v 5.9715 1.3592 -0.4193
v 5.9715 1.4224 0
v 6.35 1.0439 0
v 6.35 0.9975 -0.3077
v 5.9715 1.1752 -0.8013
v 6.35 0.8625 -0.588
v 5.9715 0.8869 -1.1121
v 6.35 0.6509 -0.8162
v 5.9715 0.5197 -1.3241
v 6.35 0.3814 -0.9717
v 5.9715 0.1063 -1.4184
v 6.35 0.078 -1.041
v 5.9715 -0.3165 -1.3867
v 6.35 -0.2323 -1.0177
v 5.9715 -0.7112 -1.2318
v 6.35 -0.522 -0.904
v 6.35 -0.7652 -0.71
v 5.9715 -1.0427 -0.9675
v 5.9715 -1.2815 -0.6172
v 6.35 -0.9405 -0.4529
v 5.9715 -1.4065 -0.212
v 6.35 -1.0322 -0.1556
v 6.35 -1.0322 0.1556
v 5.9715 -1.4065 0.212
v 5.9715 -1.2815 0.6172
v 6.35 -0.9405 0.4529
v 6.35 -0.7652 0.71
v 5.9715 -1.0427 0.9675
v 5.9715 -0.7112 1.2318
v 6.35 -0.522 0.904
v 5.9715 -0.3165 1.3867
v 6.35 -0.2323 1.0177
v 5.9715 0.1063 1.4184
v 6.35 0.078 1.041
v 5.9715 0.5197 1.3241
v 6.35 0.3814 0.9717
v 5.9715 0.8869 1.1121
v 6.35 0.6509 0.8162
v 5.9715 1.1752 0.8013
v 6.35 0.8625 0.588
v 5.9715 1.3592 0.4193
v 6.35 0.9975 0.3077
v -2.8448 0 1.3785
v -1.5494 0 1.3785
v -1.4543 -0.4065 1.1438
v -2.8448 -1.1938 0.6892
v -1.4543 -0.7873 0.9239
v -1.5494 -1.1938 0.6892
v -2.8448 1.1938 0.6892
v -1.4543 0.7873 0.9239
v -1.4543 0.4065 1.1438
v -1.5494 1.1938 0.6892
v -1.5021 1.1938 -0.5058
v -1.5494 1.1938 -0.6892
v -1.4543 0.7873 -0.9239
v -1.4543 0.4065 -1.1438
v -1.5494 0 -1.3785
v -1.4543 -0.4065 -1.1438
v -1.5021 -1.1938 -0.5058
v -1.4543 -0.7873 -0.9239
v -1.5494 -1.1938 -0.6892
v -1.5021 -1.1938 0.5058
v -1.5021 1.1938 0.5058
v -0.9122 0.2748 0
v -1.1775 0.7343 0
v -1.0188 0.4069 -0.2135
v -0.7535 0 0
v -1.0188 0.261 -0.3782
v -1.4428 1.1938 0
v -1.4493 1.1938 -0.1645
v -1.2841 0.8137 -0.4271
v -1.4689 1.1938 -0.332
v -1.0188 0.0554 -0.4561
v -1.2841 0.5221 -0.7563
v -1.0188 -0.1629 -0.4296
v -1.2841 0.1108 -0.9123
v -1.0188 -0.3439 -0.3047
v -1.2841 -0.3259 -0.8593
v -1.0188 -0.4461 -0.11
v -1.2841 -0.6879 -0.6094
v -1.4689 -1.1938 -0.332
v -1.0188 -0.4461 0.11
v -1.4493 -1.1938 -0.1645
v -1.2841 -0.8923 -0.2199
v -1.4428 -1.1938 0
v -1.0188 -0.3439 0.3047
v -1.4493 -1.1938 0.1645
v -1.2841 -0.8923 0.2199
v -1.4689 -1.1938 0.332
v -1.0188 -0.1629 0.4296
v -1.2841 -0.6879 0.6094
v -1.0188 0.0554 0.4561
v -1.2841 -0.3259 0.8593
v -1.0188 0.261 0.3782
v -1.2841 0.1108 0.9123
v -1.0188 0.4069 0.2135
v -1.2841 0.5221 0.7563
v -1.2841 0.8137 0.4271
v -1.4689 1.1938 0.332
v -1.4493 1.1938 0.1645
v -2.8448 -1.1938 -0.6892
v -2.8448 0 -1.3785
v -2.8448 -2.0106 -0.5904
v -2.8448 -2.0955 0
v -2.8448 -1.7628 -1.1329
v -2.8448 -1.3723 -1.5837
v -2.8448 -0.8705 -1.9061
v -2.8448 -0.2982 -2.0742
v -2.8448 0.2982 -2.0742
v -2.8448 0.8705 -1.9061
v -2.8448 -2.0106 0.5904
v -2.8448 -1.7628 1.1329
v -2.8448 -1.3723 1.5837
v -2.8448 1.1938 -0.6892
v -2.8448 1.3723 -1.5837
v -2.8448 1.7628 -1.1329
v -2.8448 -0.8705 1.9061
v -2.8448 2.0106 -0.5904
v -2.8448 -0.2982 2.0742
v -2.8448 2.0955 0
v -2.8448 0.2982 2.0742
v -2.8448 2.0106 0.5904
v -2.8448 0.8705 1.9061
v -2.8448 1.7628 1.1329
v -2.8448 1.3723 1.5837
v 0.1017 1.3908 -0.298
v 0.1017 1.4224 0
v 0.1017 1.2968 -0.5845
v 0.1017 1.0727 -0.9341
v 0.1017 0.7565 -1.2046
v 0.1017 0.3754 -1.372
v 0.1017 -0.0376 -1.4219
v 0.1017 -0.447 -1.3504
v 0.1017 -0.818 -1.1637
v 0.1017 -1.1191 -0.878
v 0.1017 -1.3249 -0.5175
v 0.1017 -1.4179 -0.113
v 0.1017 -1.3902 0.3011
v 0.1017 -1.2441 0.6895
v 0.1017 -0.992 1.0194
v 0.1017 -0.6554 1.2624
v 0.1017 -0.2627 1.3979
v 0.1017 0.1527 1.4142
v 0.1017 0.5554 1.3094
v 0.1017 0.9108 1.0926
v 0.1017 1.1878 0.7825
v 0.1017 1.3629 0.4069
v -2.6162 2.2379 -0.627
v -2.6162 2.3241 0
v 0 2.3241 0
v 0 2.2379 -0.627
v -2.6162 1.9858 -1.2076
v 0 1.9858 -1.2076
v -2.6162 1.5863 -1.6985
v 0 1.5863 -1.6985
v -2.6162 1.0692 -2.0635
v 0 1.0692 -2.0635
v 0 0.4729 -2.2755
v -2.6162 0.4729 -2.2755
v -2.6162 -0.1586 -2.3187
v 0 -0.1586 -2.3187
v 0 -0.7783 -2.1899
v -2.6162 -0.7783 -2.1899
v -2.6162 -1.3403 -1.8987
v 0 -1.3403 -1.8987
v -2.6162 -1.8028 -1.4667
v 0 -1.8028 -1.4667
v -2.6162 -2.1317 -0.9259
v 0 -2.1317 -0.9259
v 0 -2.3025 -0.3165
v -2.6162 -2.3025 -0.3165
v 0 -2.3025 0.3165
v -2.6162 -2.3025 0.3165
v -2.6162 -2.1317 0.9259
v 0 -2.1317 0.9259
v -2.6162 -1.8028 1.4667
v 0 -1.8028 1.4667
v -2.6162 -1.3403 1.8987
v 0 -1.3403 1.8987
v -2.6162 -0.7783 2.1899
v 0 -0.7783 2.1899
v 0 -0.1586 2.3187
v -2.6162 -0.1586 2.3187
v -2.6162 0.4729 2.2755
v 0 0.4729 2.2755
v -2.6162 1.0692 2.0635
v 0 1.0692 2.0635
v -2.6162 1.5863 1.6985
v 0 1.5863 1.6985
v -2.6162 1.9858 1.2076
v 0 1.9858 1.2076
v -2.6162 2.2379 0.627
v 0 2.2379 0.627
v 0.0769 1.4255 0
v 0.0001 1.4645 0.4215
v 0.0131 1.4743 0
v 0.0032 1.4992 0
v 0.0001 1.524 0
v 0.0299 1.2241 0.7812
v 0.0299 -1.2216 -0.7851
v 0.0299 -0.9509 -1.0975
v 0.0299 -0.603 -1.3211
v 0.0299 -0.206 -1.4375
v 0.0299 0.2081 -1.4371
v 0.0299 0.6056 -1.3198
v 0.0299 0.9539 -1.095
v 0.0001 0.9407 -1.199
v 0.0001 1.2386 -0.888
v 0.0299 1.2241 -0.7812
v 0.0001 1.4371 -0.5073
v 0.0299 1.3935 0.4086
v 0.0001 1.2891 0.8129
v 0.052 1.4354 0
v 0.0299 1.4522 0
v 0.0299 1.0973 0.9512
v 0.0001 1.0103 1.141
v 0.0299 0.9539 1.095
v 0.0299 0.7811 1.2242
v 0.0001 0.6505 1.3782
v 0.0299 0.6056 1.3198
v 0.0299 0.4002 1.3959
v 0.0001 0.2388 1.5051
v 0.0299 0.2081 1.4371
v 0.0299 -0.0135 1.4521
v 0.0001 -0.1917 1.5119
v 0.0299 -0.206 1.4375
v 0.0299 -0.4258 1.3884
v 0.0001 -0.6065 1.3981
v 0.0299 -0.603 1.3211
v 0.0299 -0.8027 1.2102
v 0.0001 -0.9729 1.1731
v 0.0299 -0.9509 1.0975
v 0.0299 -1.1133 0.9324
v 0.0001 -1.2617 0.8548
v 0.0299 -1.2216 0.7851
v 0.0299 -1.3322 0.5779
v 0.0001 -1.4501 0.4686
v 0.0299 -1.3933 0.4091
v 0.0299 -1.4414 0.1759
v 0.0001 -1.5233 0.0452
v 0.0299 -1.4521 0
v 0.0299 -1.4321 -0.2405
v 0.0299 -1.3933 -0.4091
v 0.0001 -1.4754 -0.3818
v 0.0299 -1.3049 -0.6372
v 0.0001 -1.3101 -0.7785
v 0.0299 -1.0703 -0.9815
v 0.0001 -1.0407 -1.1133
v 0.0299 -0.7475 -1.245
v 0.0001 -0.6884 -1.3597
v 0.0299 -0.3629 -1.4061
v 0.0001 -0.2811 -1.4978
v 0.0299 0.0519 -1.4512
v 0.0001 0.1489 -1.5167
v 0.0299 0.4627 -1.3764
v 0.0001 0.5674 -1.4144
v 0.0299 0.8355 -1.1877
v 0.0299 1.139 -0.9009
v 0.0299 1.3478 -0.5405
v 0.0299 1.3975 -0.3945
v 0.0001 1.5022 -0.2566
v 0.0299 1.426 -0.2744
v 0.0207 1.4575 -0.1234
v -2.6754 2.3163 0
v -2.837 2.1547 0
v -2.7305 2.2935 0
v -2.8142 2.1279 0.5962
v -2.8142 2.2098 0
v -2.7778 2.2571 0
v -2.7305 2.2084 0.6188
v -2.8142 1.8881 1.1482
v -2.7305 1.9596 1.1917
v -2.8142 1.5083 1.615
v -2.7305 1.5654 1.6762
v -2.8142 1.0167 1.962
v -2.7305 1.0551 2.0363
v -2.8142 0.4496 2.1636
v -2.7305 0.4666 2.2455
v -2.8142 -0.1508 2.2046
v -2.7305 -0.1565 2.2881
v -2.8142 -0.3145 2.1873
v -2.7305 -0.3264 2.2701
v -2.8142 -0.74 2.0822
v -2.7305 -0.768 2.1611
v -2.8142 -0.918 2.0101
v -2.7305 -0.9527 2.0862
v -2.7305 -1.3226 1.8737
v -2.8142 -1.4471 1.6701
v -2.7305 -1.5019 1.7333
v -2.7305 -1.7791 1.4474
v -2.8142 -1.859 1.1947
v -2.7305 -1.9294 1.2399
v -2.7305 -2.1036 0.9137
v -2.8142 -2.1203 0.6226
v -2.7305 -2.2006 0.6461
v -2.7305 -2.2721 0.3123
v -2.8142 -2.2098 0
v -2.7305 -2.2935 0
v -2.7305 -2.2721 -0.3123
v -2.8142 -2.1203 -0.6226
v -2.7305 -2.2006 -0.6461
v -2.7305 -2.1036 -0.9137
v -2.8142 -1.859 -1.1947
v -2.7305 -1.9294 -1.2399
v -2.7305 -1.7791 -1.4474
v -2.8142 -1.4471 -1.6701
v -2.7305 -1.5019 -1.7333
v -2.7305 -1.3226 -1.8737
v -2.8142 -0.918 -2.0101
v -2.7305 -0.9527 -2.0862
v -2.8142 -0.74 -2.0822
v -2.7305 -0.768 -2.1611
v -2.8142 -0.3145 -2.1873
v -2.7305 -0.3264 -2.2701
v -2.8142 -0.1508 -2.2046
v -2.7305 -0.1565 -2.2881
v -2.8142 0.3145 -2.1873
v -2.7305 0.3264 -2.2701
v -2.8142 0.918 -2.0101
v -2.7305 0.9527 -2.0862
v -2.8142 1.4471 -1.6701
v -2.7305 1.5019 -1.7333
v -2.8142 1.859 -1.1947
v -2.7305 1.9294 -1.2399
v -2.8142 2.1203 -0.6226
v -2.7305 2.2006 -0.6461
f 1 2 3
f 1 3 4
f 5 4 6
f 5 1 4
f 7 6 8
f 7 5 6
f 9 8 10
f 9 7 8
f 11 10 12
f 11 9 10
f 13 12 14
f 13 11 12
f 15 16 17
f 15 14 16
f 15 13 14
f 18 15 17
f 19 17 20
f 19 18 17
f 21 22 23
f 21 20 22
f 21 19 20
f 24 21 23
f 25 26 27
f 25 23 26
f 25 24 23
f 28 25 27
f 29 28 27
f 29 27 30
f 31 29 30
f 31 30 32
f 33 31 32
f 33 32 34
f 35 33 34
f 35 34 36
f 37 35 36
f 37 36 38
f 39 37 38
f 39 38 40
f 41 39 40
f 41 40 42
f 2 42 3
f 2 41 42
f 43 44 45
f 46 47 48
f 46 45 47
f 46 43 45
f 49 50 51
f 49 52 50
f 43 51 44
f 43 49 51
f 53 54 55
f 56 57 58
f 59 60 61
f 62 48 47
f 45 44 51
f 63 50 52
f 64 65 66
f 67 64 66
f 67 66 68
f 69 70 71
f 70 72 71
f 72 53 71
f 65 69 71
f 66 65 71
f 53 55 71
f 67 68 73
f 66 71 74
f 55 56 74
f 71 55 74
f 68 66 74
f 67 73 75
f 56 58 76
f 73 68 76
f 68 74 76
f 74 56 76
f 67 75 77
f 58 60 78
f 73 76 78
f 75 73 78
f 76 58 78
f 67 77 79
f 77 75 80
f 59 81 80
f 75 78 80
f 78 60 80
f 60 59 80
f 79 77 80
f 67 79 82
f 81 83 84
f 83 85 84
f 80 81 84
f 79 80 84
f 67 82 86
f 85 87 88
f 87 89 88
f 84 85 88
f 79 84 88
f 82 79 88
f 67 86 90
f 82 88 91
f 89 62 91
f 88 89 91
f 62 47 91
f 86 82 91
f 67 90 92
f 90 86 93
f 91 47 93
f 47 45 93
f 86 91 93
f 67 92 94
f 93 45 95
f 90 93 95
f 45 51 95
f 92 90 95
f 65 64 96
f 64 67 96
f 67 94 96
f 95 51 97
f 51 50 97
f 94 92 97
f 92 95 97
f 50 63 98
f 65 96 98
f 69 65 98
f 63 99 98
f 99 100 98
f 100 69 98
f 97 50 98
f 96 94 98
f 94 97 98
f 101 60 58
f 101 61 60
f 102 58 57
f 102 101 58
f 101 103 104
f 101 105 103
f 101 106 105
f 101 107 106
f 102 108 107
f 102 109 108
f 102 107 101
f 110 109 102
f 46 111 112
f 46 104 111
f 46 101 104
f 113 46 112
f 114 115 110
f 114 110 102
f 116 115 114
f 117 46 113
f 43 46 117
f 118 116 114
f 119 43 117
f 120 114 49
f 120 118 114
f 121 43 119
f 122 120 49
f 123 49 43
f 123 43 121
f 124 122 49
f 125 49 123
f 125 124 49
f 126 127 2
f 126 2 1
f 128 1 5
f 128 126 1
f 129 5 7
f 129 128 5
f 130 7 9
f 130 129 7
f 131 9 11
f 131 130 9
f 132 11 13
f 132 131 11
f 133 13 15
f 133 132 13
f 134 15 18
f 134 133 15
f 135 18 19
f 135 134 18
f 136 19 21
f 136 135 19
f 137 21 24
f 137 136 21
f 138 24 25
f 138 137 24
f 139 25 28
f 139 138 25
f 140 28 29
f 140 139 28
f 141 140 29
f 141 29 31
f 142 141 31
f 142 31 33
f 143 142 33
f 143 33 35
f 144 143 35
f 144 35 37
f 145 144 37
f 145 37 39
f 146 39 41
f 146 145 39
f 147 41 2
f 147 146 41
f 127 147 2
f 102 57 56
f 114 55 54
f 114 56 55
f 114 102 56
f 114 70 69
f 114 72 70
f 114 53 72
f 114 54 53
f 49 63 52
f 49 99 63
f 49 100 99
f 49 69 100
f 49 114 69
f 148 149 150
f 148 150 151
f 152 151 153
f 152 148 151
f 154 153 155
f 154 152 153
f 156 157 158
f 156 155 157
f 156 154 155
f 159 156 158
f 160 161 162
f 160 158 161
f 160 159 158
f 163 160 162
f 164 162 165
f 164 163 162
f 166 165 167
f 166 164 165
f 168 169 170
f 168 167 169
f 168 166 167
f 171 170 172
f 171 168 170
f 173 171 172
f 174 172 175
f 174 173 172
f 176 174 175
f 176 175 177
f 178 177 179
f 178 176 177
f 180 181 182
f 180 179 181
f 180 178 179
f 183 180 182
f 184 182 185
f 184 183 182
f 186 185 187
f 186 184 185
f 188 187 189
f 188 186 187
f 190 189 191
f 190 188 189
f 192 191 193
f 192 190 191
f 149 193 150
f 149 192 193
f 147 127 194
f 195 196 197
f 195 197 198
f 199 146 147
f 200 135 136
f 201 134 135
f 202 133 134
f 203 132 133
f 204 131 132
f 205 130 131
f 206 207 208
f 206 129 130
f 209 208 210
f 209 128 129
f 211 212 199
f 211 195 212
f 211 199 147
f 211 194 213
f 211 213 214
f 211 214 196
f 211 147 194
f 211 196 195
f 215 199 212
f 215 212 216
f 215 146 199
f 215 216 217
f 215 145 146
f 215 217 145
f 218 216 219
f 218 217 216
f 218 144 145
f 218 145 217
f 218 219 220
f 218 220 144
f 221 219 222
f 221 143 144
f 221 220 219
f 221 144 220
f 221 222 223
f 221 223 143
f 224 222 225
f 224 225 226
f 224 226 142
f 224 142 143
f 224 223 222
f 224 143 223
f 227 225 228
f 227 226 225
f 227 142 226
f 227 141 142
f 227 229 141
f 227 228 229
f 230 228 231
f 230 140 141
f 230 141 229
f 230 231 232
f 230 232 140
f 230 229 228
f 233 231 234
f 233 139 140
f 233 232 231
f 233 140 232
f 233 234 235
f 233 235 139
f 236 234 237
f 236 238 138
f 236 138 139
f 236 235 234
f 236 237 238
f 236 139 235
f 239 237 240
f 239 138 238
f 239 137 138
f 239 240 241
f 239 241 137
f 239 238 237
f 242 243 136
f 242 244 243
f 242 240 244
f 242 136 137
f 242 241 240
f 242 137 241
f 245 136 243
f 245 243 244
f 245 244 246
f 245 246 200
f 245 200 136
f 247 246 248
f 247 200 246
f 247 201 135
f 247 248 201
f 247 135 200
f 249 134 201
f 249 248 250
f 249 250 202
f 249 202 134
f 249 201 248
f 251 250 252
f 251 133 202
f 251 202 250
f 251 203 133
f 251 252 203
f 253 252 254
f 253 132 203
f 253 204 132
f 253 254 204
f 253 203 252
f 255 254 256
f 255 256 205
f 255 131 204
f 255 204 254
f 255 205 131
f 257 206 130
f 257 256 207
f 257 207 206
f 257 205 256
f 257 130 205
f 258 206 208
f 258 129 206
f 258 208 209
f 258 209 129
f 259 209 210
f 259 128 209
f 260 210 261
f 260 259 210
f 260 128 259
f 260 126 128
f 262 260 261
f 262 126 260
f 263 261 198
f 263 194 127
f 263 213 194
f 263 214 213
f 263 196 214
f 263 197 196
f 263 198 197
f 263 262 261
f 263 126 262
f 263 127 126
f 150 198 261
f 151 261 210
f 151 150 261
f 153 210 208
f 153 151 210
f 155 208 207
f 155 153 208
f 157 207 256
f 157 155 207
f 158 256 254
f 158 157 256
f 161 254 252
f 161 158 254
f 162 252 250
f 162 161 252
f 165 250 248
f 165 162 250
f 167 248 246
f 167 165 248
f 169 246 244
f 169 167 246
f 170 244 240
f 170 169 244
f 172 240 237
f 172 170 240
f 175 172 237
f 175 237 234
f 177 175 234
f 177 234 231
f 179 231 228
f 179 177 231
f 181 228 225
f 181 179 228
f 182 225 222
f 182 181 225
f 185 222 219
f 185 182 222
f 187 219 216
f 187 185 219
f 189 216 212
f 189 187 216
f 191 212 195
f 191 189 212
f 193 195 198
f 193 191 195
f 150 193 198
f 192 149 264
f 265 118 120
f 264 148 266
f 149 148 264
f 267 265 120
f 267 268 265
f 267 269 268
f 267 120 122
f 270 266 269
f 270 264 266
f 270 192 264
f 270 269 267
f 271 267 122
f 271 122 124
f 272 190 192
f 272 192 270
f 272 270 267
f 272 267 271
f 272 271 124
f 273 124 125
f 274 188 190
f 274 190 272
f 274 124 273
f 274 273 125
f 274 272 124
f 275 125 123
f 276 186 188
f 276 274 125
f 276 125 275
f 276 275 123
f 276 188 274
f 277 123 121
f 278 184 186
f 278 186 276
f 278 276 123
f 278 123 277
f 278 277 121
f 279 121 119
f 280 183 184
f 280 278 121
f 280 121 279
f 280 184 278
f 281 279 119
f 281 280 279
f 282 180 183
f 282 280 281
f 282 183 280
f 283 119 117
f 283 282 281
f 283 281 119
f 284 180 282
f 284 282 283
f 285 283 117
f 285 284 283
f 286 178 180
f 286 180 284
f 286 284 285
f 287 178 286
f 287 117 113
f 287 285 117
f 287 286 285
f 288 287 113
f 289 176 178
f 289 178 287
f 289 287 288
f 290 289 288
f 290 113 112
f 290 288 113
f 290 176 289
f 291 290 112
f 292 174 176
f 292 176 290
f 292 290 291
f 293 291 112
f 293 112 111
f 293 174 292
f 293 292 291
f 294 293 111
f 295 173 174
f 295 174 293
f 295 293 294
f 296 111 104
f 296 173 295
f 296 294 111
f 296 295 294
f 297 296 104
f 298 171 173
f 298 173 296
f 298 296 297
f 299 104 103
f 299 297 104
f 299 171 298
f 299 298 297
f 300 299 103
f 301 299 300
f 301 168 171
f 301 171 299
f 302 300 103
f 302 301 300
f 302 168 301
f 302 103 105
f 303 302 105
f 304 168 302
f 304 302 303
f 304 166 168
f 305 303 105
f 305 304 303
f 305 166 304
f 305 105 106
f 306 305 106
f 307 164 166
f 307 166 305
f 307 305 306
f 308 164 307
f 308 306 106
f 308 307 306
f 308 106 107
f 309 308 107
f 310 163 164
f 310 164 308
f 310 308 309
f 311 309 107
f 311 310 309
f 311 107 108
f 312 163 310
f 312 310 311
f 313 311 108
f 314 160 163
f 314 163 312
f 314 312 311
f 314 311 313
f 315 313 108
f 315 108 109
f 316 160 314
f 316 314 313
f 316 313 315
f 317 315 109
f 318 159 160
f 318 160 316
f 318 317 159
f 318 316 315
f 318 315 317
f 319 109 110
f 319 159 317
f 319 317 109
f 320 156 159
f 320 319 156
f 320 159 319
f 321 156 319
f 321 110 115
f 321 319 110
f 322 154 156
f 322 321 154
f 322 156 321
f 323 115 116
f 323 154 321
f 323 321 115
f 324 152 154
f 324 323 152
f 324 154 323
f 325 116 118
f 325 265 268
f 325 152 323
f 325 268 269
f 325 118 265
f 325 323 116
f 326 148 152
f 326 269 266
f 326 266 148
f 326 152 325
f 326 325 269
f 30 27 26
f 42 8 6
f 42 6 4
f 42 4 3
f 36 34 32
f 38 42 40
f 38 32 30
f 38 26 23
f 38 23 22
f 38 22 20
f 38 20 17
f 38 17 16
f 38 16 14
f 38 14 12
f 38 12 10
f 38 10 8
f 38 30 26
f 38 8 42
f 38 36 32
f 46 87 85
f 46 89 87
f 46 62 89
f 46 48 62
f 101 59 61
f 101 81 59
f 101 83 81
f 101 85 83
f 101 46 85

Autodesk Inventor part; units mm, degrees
ref_plane "YZ Plane" through (0, 0, 0) normal (1, 0, 0) x (0, 1, 0)
ref_plane "XZ Plane" through (0, 0, 0) normal (0, 1, 0) x (-1, 0, 0)
sketch "Sketch1" plane through (0, 0, 0) normal (0, 0, 1) x (1, 0, 0)
  line L0 (-0.7535, 0) -> (6.35, 0)
  line L1 (6.35, 0) -> (6.35, 1.4224)
  line L2 (6.35, 1.4224) -> (1.5877, 1.4224)
  line L3 (1.5877, 1.4224) -> (0.0001, 1.4224)
  line L4 (0.0001, 1.4224) -> (0, 1.4224)
  line L5 (0, 1.4224) -> (0, 2.3241)
  line L6 (0, 2.3241) -> (-2.8448, 2.3241)
  line L7 (-2.8448, 2.3241) -> (-2.8448, 1.3785)
  line L8 (-2.8448, 1.3785) -> (-1.5494, 1.3785)
  line L9 (-1.5494, 1.3785) -> (-0.7535, 0)
  line L10 (-4.6838, 0) -> (8.189, 0) projected
  line L11 (0, -0.4648) -> (0, 2.7889) projected
  line L12 (1.5877, 1.4224) -> (0, 1.4224) construction
  dimension "d1" = 4.7623
  dimension "d2" = 1.5876
  dimension "d3" = 2.8448
  dimension "d4" = 1.2954
  dimension "d5" = 60
  dimension "d6" = 2.8448
  dimension "d7" = 2.8448
  dimension "d8" = 2.757
  dimension "d9" = 4.6482
  dimension "d26" = 6.35
revolve "Body" add sketch "Sketch1" angle 360 about axis through (-0.7535, 0, 0) along (1, 0, 0)
sketch "Sketch2" plane through (-2.8448, 0, 0) normal (-1, 0, 0) x (0, 0, 1)
  circle A0 centre (0, 0) radius 1.3785 projected
  line L0 (0, -3.2537) -> (0, 3.2537) projected
  line L1 (-3.2537, 0) -> (3.2537, 0) projected
  line L2 (1.3785, 0) -> (0.6892, -1.1938)
  line L3 (0.6892, -1.1938) -> (-0.6892, -1.1938)
  line L4 (-0.6892, -1.1938) -> (-1.3785, 0)
  line L5 (-1.3785, 0) -> (-0.6892, 1.1938)
  line L6 (-0.6892, 1.1938) -> (0.6892, 1.1938)
  line L7 (0.6892, 1.1938) -> (1.3785, 0)
  point P0 (0, 0)
extrude "Slot" add sketch "Sketch2" against normal up to next contours L7 A0 | A0 L2 | L6 L0 A0 | A0 L0 L3 | L0 L6 A0 | A0 L3 L0 | L4 A0 | A0 L5
fillet "Fillet1" radius 0.2286 1 edges at (-2.8448, -2.3241, 0)
thread "Thread" size "4-40 UNC" class "2A" standard "ANSI Unified Screw Threads" length 4.7623
chamfer "Chamfer1" distance 0.3785 distance2 0.3785 1 edges at (6.35, -1.4224, 0) measured on face at (6.35, -0.0627, 0.6443)
ref_plane "Work Plane1" through (29, 0, 0) normal (0, -1, 0) x (1, 0, 0)
fillet "Fillet2" radius 0.1016 1 edges at (0.0001, -1.4224, 0)
equation "\"d1\" = GEL"
equation "\"d3\" = KOH"
equation "\"d4\" = INTI"
equation "\"d6\" = GD"
equation "\"d7\" = BDM"
equation "\"d8\" = 1.1547 * SW"
equation "\"d9\" = KOD"
equation "\"d26\" = NLG"
equation "\"d30\" = R"
equation "\"d17\" = RR"
equation "\"d13\" = GEL"
equation "\"d15\" = -0.5 * SPD + 0.5 * GD"
equation "\"d16\" = GUL"
equation "\"GD\" = 2.8448"
equation "\"NLG\" = 6.35"
equation "\"GEL\" = 4.7623"
equation "\"KOD\" = 4.6482"
equation "\"KOH\" = 2.8448"
equation "\"INTI\" = 1.2954"
equation "\"GAL\" = 1.5875"
equation "\"GUL\" = 0.37846"
equation "\"BDM\" = 2.8448"
equation "\"SW\" = 2.3876"
equation "\"RR\" = 0.2286"
equation "\"SPD\" = 2.08788"
equation "\"R\" = 0.1016"
equation "\"PHH\" = 0.127"
equation "\"GD1\" = SPD"
equation "\"THREADDIA\" = 2.8448"
equation "\"FAWI\" = 45deg"
equation "\"KOH1\" = 2.5654"
equation "\"NND\" = 2.8448"
equation "\"TOA\" = 30deg"
equation "\"E0\" = 1.155 * SW"
properties part number "ANSI B18.3 - No. 4 - 40 UNC - 1/4 HS HCS" material "Steel, Mild"
